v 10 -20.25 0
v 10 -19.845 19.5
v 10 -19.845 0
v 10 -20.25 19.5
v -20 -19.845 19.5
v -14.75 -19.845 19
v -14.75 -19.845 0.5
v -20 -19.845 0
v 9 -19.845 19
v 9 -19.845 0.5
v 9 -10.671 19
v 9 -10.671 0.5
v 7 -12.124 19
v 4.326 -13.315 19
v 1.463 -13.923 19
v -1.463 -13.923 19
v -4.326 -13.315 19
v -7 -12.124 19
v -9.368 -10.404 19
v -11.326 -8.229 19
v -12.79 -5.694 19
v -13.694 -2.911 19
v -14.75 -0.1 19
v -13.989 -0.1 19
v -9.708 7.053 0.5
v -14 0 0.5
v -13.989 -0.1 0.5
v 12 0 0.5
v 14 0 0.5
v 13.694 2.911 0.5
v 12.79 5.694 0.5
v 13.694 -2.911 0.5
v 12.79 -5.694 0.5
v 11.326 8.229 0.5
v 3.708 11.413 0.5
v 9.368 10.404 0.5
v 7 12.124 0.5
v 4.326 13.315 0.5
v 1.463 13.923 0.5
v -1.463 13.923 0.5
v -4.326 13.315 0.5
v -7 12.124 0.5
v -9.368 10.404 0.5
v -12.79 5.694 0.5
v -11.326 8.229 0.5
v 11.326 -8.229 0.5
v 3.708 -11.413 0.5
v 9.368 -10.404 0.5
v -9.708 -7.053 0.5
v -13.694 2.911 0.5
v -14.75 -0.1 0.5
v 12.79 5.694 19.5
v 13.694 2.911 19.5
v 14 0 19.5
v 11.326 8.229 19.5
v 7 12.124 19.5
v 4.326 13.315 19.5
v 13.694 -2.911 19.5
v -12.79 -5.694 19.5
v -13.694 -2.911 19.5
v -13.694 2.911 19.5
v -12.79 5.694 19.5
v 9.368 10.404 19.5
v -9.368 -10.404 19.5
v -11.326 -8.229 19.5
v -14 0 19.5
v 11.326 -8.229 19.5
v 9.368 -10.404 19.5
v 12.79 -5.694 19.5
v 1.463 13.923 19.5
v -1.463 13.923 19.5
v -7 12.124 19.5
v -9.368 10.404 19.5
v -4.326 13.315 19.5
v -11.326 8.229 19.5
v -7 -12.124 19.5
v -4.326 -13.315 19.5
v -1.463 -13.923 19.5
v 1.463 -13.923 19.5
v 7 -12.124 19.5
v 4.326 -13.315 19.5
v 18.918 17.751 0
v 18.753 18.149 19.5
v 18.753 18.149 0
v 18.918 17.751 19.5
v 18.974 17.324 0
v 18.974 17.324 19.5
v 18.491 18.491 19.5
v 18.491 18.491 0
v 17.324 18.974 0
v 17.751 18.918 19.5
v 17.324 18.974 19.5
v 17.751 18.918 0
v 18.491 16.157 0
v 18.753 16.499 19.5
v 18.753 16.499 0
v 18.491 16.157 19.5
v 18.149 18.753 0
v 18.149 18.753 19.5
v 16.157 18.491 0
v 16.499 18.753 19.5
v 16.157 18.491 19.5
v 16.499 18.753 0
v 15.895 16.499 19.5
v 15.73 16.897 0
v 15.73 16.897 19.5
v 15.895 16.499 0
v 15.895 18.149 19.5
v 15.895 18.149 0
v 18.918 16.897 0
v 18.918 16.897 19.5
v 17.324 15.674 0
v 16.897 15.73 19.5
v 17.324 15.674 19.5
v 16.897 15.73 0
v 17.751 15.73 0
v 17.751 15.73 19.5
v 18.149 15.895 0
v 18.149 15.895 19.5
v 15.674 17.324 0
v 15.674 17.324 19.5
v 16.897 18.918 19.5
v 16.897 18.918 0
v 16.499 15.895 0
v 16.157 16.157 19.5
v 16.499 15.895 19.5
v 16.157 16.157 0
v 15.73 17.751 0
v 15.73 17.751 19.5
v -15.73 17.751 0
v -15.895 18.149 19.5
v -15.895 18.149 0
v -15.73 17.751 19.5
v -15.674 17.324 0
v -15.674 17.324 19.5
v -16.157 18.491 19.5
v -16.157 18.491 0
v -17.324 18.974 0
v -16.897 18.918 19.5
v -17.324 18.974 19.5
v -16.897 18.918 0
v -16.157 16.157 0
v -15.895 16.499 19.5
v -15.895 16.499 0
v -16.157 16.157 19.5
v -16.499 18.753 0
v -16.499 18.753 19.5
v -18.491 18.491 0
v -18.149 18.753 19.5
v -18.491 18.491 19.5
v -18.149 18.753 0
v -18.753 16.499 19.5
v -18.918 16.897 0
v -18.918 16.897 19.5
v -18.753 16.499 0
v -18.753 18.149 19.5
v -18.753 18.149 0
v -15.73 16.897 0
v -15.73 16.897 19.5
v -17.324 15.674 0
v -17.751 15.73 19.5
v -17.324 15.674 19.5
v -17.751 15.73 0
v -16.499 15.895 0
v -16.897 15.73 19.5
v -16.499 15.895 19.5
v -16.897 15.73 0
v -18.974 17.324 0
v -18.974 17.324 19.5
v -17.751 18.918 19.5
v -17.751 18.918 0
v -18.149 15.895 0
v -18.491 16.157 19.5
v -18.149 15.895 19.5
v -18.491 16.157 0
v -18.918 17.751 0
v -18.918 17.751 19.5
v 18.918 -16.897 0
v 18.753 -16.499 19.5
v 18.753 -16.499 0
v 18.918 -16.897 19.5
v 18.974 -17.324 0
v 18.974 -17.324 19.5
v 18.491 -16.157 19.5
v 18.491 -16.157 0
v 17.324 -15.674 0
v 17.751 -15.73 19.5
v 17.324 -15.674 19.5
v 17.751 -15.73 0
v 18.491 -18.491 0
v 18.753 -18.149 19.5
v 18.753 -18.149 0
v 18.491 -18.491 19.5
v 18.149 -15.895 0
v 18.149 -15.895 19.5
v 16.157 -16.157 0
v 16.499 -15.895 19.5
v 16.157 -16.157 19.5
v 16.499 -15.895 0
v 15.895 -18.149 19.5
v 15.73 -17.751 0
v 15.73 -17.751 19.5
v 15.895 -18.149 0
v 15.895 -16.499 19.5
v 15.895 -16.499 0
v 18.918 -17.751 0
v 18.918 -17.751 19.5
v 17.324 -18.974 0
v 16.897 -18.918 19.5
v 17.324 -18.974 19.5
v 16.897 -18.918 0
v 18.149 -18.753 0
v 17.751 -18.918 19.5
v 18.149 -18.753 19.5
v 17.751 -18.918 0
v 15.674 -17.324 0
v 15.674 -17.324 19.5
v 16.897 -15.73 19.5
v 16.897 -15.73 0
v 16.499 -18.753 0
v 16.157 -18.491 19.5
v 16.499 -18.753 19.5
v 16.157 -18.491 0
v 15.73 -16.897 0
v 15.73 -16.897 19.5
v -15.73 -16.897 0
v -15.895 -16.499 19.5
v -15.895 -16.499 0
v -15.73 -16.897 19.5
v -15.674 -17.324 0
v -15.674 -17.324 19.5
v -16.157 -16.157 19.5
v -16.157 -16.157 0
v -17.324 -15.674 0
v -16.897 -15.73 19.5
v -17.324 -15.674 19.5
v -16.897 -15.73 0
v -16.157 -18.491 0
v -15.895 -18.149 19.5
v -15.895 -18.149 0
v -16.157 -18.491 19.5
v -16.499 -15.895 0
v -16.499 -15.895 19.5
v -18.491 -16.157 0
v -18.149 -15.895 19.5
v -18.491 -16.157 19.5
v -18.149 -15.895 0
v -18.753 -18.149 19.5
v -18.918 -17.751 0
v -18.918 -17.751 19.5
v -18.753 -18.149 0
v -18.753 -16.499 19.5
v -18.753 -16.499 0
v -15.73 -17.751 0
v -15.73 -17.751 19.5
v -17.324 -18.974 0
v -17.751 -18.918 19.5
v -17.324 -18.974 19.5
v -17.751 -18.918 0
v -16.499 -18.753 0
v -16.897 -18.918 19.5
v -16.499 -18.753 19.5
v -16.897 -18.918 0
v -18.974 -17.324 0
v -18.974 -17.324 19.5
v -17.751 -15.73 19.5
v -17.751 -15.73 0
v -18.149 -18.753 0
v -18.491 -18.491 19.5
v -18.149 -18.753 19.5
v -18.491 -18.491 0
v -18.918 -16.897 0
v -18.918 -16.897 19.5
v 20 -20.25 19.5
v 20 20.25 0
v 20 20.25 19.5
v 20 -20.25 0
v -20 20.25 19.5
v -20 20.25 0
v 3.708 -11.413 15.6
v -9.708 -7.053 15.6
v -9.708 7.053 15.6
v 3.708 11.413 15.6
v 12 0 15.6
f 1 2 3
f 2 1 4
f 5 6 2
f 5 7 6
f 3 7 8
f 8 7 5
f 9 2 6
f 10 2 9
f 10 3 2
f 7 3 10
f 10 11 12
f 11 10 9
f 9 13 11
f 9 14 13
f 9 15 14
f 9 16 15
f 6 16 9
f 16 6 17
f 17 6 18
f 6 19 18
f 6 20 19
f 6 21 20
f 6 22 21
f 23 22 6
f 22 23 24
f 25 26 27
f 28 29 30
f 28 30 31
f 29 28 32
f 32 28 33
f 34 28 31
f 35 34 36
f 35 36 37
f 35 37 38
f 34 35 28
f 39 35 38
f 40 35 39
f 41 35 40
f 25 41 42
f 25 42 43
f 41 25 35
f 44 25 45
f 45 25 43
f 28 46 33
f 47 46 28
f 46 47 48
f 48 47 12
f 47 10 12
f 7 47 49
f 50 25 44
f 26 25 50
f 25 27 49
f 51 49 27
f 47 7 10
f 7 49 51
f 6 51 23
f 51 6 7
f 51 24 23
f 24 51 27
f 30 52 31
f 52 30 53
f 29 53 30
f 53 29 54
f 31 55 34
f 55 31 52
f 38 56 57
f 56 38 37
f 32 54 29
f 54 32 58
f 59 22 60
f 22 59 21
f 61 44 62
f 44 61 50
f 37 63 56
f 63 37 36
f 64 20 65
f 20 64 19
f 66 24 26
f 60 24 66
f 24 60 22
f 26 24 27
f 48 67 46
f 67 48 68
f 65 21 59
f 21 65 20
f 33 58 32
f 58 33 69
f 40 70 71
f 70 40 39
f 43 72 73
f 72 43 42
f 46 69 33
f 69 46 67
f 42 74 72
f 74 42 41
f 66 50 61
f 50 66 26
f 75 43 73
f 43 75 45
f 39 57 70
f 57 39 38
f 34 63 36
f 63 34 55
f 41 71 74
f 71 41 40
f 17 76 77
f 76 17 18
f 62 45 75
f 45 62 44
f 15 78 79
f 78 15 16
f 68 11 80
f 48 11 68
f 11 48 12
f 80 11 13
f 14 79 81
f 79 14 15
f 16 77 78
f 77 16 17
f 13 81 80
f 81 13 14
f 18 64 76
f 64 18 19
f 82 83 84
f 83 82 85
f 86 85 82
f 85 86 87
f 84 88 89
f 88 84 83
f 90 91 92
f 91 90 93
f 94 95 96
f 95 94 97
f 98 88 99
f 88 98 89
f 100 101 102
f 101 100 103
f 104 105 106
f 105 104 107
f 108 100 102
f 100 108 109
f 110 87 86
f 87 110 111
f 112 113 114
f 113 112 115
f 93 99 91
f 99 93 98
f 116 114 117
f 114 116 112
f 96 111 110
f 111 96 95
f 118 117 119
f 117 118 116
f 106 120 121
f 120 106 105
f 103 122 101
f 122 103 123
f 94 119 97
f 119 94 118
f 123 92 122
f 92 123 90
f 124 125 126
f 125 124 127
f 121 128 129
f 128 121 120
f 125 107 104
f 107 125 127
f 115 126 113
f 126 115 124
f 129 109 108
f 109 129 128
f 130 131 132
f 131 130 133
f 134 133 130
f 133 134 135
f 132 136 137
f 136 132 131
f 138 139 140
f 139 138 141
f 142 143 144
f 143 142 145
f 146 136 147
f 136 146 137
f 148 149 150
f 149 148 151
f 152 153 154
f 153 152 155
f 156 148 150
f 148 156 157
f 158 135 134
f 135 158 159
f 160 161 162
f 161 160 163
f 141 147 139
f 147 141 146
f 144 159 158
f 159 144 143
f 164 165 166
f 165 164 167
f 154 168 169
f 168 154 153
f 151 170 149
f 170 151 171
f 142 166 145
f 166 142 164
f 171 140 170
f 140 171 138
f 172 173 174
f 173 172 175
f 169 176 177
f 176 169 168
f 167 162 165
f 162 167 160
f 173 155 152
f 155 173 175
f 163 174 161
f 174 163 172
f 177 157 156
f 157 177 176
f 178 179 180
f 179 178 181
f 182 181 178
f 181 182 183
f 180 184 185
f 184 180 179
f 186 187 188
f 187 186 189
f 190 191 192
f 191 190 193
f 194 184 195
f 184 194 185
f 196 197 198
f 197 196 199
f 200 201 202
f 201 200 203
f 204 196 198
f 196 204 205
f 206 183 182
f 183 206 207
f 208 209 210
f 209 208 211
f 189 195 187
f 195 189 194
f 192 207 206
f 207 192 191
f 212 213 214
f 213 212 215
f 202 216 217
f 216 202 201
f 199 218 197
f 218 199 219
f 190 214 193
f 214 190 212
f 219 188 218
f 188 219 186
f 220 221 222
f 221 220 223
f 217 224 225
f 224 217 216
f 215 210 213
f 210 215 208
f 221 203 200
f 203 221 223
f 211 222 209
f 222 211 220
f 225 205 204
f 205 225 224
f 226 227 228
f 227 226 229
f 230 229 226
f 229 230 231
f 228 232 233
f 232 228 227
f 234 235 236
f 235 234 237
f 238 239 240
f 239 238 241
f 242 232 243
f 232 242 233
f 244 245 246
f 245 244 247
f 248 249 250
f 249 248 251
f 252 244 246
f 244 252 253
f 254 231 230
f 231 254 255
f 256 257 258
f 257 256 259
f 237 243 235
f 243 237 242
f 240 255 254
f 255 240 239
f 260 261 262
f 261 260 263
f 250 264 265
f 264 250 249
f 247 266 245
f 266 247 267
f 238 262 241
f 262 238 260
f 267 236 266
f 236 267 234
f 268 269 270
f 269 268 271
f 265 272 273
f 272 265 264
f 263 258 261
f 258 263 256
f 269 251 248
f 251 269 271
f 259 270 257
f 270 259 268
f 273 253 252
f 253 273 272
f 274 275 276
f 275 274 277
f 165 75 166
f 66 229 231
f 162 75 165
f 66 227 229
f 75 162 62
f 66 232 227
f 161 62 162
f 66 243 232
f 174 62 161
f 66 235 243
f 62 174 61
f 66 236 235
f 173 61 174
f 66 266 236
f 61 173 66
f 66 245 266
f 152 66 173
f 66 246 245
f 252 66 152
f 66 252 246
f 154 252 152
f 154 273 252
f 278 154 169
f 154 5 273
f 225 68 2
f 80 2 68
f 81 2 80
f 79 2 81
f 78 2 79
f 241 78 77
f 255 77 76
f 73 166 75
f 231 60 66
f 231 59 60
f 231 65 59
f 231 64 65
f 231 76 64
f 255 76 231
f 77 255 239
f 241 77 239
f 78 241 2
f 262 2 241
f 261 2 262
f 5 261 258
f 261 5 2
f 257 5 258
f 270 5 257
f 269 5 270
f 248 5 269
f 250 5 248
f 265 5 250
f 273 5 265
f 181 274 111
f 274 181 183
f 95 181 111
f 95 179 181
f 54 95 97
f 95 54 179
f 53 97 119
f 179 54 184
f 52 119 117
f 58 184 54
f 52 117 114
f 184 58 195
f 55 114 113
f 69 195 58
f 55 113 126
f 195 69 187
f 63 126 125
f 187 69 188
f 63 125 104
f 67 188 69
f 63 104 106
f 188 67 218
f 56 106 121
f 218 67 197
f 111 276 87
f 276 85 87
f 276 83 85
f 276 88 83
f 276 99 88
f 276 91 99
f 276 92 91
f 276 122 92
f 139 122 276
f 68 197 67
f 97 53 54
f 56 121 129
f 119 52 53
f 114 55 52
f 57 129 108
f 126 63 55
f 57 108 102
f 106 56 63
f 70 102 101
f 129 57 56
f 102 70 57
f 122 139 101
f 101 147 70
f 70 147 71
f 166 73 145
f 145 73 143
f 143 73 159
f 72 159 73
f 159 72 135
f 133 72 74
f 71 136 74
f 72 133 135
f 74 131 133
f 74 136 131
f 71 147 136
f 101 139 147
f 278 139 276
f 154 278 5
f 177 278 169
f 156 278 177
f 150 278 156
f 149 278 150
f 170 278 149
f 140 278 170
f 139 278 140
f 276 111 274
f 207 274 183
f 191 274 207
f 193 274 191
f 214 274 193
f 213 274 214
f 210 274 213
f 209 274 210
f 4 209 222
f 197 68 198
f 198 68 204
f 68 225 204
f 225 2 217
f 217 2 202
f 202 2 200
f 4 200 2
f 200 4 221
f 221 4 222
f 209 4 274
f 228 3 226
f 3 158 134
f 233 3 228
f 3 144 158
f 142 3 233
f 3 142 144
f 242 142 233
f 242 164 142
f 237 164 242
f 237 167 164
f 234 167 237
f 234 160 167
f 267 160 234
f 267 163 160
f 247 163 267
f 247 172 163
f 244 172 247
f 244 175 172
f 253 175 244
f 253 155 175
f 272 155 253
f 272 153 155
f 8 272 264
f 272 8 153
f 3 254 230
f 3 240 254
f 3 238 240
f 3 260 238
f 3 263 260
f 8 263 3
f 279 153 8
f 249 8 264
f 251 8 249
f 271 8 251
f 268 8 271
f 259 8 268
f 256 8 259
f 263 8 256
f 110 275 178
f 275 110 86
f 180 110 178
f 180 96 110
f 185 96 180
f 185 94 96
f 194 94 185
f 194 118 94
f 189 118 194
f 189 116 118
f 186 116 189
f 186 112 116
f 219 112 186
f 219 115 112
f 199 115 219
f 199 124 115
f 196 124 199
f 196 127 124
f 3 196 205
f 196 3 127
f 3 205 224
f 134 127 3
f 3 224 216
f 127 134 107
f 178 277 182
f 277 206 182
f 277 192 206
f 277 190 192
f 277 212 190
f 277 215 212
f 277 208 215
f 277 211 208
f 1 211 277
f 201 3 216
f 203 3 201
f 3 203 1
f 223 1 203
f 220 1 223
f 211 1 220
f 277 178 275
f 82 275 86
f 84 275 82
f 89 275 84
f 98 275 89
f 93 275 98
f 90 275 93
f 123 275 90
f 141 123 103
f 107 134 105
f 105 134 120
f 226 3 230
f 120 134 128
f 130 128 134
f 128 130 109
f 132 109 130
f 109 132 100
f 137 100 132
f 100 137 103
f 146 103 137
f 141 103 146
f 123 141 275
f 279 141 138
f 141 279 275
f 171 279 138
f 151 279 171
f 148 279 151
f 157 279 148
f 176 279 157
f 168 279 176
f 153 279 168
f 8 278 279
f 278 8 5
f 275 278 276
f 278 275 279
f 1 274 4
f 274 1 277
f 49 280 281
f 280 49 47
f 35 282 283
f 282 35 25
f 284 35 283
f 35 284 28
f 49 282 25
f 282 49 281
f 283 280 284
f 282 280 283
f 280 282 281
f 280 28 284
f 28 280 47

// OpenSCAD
//
// Copyright (C) 2015, Jason S. McMullan <jason.mcmullan@gmail.com>
// All right reserved.
//
// Licensed under the MIT License:
//
// Permission is hereby granted, free of charge, to any person obtaining
// a copy of this software and associated documentation files (the "Software"),
// to deal in the Software without restriction, including without limitation
// the rights to use, copy, modify, merge, publish, distribute, sublicense,
// and/or sell copies of the Software, and to permit persons to whom the
// Software is furnished to do so, subject to the following conditions:
//
// The above copyright notice and this permission notice shall be included
// in all copies or substantial portions of the Software.
//
// THE SOFTWARE IS PROVIDED "AS IS", WITHOUT WARRANTY OF ANY KIND, EXPRESS OR
// IMPLIED, INCLUDING BUT NOT LIMITED TO THE WARRANTIES OF MERCHANTABILITY,
// FITNESS FOR A PARTICULAR PURPOSE AND NONINFRINGEMENT. IN NO EVENT SHALL THE
// AUTHORS OR COPYRIGHT HOLDERS BE LIABLE FOR ANY CLAIM, DAMAGES OR OTHER
// LIABILITY, WHETHER IN AN ACTION OF CONTRACT, TORT OR OTHERWISE, ARISING
// FROM, OUT OF OR IN CONNECTION WITH THE SOFTWARE OR THE USE OR OTHER
// DEALINGS IN THE SOFTWARE.
//
// All units are in mm

module blower(height=40.5, width=40.0, depth=19.5, spacing=49.0) {
    difference() {
        translate([-width/2, -height/2, 0])
            cube([width, height, depth]);
        translate([0, 0, -0.1]) {
            translate([-width/2-0.1, -height/2-0.1, 0]) cube([width*0.75+0.1, height*0.01+0.1, depth+0.2]);
            translate([-width/2+5.25, -height/2-0.1, 0.5+0.1])
                cube([width*0.75-6.25, height/2, depth-1]);
            translate([0, 0, 0.5 + 0.1]) cylinder(d=width*0.7, h=depth+0.2);
            translate([spacing/2*sin(45), spacing/2*cos(45), 0])
                cylinder(d=3.3, h=depth+0.2, $fn=24);
            translate([-spacing/2*sin(45), spacing/2*cos(45), 0])
                cylinder(d=3.3, h=depth+0.2, $fn=24);
            translate([spacing/2*sin(45), -spacing/2*cos(45), 0])
                cylinder(d=3.3, h=depth+0.2, $fn=24);
            translate([-spacing/2*sin(45), -spacing/2*cos(45), 0])
                cylinder(d=3.3, h=depth+0.2, $fn=24);
        }
    }
    cylinder(d=width*0.6, h=depth*0.8, $fn=5);
}

# blower();

// vim: set shiftwidth=4 expandtab: //
